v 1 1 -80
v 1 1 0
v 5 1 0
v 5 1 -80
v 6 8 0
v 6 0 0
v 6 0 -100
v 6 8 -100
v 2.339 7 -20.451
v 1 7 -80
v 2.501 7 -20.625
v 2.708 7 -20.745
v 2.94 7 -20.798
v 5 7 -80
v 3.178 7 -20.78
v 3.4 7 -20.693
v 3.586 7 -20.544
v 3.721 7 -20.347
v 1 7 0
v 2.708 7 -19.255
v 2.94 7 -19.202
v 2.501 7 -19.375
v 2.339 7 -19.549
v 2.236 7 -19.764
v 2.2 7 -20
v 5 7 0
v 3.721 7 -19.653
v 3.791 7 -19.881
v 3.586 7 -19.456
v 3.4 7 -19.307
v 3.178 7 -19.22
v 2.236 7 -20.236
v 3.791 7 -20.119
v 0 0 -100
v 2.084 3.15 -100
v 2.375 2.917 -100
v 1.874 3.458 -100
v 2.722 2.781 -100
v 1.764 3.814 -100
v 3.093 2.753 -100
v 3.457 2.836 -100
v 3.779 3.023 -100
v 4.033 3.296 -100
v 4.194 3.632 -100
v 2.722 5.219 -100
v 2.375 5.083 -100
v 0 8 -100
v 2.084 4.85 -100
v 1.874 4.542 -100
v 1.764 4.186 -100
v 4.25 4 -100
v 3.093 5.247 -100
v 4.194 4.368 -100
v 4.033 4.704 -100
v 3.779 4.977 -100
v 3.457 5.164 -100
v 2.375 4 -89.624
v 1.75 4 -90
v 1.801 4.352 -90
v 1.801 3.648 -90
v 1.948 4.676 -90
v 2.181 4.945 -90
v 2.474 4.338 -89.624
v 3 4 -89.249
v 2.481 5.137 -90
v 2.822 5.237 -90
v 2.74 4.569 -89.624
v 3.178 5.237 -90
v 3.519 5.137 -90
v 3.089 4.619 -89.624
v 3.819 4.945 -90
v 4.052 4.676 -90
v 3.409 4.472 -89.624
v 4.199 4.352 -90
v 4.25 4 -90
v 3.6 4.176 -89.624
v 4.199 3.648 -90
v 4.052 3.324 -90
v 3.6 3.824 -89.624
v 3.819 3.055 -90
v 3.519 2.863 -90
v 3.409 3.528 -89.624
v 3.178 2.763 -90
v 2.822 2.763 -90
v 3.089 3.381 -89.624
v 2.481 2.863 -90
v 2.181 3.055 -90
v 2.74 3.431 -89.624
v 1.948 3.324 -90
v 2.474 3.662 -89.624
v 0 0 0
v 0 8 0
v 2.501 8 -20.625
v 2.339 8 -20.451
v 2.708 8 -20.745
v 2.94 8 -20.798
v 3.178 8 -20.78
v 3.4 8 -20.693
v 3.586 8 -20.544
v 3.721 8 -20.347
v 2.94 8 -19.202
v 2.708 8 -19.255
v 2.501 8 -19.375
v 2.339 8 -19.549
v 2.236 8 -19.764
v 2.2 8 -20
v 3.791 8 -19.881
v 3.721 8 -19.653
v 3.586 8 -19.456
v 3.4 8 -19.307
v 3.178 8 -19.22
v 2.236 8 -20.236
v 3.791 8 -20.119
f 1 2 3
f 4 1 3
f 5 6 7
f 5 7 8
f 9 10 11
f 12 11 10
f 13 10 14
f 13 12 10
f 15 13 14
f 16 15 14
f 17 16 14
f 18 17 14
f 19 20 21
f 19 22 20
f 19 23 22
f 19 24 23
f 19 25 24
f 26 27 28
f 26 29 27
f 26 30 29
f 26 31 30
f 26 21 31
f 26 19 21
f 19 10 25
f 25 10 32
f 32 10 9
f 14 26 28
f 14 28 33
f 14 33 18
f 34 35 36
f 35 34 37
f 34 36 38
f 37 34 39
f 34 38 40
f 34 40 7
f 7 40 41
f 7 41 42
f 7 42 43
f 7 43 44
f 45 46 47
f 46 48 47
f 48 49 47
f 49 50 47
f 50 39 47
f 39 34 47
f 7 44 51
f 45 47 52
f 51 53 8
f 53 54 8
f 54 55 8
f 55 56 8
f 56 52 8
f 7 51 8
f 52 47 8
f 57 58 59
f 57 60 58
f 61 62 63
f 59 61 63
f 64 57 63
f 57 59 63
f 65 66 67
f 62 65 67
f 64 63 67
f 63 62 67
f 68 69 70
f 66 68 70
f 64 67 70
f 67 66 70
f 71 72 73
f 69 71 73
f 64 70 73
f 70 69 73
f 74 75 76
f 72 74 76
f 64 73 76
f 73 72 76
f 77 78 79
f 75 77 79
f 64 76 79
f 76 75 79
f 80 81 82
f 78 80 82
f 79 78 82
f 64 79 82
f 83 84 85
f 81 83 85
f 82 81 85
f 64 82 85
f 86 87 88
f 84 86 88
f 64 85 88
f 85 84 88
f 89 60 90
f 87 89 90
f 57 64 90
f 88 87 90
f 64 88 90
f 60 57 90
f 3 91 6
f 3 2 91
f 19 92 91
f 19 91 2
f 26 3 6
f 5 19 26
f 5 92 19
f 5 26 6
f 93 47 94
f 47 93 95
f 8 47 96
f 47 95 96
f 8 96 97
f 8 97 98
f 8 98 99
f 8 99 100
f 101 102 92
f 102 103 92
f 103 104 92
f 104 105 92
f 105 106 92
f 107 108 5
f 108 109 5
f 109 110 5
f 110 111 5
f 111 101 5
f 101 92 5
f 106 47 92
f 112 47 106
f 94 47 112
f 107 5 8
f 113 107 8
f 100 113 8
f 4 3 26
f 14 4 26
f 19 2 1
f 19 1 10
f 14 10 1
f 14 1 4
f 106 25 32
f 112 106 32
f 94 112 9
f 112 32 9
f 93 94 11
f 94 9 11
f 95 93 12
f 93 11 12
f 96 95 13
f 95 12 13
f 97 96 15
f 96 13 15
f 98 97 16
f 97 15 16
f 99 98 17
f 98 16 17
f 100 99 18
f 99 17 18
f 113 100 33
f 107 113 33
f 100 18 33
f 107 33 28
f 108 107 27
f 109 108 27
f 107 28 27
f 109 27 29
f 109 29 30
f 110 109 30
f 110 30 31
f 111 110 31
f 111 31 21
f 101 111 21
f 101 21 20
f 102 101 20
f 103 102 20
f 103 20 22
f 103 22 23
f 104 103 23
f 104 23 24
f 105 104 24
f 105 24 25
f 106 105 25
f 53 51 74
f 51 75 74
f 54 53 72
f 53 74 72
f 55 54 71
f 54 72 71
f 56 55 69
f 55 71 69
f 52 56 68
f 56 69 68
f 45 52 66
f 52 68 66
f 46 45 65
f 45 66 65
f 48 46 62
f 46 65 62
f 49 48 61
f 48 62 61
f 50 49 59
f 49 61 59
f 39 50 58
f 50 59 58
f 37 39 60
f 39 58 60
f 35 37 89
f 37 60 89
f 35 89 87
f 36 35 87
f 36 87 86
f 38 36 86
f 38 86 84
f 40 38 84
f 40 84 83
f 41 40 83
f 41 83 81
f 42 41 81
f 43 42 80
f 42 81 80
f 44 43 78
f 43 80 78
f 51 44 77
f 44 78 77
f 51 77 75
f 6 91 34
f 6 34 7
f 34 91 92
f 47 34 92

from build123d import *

# Parameters (mm, degrees)
ESQUISSE1_W             = 6
ESQUISSE1_H             = 8
BOSS_EXTRU_1_DEPTH      = 100
ESQUISSE2_W             = 4
ESQUISSE2_H             = 6
ENL_V_MAT_EXTRU_1_DEPTH = 80
TROU_TARAUD_M21_D       = 1.6
TROU_TARAUD_M21_DEPTH   = 4
TROU_TARAUD_M21_TIP     = 0.480688495
TROU_TARAUD_M31_D       = 2.5
TROU_TARAUD_M31_DEPTH   = 10
TROU_TARAUD_M31_TIP     = 0.751075774


with BuildPart() as part:
    # Esquisse1 → Boss.-Extru.1 (new body)
    with BuildSketch(Plane.XY):
        with Locations((3, 4)):
            Rectangle(ESQUISSE1_W, ESQUISSE1_H)
    extrude(amount=-BOSS_EXTRU_1_DEPTH)

    # Esquisse2 → Enlèv. mat.-Extru.1 (cut)
    with BuildSketch(Plane.XY):
        with Locations((3, 4)):
            Rectangle(ESQUISSE2_W, ESQUISSE2_H)
    extrude(amount=-ENL_V_MAT_EXTRU_1_DEPTH, mode=Mode.SUBTRACT)

    # Trou taraudé M21
    with Locations(Plane(origin=(0, 8, 0), x_dir=(1, 0, 0), z_dir=(0, 1, 0))):
        with Locations((3, 20)):
            Hole(TROU_TARAUD_M21_D / 2, depth=TROU_TARAUD_M21_DEPTH)
            with Locations((0, 0, -(TROU_TARAUD_M21_DEPTH + TROU_TARAUD_M21_TIP / 2))):  # 118° drill point
                Cone(0, TROU_TARAUD_M21_D / 2, TROU_TARAUD_M21_TIP, mode=Mode.SUBTRACT)

    # Trou taraudé M31
    with Locations(Plane(origin=(0, 0, -100), x_dir=(-1, 0, 0), z_dir=(0, 0, -1))):
        with Locations((-3, 4)):
            Hole(TROU_TARAUD_M31_D / 2, depth=TROU_TARAUD_M31_DEPTH)
            with Locations((0, 0, -(TROU_TARAUD_M31_DEPTH + TROU_TARAUD_M31_TIP / 2))):  # 118° drill point
                Cone(0, TROU_TARAUD_M31_D / 2, TROU_TARAUD_M31_TIP, mode=Mode.SUBTRACT)


solid = part.part
